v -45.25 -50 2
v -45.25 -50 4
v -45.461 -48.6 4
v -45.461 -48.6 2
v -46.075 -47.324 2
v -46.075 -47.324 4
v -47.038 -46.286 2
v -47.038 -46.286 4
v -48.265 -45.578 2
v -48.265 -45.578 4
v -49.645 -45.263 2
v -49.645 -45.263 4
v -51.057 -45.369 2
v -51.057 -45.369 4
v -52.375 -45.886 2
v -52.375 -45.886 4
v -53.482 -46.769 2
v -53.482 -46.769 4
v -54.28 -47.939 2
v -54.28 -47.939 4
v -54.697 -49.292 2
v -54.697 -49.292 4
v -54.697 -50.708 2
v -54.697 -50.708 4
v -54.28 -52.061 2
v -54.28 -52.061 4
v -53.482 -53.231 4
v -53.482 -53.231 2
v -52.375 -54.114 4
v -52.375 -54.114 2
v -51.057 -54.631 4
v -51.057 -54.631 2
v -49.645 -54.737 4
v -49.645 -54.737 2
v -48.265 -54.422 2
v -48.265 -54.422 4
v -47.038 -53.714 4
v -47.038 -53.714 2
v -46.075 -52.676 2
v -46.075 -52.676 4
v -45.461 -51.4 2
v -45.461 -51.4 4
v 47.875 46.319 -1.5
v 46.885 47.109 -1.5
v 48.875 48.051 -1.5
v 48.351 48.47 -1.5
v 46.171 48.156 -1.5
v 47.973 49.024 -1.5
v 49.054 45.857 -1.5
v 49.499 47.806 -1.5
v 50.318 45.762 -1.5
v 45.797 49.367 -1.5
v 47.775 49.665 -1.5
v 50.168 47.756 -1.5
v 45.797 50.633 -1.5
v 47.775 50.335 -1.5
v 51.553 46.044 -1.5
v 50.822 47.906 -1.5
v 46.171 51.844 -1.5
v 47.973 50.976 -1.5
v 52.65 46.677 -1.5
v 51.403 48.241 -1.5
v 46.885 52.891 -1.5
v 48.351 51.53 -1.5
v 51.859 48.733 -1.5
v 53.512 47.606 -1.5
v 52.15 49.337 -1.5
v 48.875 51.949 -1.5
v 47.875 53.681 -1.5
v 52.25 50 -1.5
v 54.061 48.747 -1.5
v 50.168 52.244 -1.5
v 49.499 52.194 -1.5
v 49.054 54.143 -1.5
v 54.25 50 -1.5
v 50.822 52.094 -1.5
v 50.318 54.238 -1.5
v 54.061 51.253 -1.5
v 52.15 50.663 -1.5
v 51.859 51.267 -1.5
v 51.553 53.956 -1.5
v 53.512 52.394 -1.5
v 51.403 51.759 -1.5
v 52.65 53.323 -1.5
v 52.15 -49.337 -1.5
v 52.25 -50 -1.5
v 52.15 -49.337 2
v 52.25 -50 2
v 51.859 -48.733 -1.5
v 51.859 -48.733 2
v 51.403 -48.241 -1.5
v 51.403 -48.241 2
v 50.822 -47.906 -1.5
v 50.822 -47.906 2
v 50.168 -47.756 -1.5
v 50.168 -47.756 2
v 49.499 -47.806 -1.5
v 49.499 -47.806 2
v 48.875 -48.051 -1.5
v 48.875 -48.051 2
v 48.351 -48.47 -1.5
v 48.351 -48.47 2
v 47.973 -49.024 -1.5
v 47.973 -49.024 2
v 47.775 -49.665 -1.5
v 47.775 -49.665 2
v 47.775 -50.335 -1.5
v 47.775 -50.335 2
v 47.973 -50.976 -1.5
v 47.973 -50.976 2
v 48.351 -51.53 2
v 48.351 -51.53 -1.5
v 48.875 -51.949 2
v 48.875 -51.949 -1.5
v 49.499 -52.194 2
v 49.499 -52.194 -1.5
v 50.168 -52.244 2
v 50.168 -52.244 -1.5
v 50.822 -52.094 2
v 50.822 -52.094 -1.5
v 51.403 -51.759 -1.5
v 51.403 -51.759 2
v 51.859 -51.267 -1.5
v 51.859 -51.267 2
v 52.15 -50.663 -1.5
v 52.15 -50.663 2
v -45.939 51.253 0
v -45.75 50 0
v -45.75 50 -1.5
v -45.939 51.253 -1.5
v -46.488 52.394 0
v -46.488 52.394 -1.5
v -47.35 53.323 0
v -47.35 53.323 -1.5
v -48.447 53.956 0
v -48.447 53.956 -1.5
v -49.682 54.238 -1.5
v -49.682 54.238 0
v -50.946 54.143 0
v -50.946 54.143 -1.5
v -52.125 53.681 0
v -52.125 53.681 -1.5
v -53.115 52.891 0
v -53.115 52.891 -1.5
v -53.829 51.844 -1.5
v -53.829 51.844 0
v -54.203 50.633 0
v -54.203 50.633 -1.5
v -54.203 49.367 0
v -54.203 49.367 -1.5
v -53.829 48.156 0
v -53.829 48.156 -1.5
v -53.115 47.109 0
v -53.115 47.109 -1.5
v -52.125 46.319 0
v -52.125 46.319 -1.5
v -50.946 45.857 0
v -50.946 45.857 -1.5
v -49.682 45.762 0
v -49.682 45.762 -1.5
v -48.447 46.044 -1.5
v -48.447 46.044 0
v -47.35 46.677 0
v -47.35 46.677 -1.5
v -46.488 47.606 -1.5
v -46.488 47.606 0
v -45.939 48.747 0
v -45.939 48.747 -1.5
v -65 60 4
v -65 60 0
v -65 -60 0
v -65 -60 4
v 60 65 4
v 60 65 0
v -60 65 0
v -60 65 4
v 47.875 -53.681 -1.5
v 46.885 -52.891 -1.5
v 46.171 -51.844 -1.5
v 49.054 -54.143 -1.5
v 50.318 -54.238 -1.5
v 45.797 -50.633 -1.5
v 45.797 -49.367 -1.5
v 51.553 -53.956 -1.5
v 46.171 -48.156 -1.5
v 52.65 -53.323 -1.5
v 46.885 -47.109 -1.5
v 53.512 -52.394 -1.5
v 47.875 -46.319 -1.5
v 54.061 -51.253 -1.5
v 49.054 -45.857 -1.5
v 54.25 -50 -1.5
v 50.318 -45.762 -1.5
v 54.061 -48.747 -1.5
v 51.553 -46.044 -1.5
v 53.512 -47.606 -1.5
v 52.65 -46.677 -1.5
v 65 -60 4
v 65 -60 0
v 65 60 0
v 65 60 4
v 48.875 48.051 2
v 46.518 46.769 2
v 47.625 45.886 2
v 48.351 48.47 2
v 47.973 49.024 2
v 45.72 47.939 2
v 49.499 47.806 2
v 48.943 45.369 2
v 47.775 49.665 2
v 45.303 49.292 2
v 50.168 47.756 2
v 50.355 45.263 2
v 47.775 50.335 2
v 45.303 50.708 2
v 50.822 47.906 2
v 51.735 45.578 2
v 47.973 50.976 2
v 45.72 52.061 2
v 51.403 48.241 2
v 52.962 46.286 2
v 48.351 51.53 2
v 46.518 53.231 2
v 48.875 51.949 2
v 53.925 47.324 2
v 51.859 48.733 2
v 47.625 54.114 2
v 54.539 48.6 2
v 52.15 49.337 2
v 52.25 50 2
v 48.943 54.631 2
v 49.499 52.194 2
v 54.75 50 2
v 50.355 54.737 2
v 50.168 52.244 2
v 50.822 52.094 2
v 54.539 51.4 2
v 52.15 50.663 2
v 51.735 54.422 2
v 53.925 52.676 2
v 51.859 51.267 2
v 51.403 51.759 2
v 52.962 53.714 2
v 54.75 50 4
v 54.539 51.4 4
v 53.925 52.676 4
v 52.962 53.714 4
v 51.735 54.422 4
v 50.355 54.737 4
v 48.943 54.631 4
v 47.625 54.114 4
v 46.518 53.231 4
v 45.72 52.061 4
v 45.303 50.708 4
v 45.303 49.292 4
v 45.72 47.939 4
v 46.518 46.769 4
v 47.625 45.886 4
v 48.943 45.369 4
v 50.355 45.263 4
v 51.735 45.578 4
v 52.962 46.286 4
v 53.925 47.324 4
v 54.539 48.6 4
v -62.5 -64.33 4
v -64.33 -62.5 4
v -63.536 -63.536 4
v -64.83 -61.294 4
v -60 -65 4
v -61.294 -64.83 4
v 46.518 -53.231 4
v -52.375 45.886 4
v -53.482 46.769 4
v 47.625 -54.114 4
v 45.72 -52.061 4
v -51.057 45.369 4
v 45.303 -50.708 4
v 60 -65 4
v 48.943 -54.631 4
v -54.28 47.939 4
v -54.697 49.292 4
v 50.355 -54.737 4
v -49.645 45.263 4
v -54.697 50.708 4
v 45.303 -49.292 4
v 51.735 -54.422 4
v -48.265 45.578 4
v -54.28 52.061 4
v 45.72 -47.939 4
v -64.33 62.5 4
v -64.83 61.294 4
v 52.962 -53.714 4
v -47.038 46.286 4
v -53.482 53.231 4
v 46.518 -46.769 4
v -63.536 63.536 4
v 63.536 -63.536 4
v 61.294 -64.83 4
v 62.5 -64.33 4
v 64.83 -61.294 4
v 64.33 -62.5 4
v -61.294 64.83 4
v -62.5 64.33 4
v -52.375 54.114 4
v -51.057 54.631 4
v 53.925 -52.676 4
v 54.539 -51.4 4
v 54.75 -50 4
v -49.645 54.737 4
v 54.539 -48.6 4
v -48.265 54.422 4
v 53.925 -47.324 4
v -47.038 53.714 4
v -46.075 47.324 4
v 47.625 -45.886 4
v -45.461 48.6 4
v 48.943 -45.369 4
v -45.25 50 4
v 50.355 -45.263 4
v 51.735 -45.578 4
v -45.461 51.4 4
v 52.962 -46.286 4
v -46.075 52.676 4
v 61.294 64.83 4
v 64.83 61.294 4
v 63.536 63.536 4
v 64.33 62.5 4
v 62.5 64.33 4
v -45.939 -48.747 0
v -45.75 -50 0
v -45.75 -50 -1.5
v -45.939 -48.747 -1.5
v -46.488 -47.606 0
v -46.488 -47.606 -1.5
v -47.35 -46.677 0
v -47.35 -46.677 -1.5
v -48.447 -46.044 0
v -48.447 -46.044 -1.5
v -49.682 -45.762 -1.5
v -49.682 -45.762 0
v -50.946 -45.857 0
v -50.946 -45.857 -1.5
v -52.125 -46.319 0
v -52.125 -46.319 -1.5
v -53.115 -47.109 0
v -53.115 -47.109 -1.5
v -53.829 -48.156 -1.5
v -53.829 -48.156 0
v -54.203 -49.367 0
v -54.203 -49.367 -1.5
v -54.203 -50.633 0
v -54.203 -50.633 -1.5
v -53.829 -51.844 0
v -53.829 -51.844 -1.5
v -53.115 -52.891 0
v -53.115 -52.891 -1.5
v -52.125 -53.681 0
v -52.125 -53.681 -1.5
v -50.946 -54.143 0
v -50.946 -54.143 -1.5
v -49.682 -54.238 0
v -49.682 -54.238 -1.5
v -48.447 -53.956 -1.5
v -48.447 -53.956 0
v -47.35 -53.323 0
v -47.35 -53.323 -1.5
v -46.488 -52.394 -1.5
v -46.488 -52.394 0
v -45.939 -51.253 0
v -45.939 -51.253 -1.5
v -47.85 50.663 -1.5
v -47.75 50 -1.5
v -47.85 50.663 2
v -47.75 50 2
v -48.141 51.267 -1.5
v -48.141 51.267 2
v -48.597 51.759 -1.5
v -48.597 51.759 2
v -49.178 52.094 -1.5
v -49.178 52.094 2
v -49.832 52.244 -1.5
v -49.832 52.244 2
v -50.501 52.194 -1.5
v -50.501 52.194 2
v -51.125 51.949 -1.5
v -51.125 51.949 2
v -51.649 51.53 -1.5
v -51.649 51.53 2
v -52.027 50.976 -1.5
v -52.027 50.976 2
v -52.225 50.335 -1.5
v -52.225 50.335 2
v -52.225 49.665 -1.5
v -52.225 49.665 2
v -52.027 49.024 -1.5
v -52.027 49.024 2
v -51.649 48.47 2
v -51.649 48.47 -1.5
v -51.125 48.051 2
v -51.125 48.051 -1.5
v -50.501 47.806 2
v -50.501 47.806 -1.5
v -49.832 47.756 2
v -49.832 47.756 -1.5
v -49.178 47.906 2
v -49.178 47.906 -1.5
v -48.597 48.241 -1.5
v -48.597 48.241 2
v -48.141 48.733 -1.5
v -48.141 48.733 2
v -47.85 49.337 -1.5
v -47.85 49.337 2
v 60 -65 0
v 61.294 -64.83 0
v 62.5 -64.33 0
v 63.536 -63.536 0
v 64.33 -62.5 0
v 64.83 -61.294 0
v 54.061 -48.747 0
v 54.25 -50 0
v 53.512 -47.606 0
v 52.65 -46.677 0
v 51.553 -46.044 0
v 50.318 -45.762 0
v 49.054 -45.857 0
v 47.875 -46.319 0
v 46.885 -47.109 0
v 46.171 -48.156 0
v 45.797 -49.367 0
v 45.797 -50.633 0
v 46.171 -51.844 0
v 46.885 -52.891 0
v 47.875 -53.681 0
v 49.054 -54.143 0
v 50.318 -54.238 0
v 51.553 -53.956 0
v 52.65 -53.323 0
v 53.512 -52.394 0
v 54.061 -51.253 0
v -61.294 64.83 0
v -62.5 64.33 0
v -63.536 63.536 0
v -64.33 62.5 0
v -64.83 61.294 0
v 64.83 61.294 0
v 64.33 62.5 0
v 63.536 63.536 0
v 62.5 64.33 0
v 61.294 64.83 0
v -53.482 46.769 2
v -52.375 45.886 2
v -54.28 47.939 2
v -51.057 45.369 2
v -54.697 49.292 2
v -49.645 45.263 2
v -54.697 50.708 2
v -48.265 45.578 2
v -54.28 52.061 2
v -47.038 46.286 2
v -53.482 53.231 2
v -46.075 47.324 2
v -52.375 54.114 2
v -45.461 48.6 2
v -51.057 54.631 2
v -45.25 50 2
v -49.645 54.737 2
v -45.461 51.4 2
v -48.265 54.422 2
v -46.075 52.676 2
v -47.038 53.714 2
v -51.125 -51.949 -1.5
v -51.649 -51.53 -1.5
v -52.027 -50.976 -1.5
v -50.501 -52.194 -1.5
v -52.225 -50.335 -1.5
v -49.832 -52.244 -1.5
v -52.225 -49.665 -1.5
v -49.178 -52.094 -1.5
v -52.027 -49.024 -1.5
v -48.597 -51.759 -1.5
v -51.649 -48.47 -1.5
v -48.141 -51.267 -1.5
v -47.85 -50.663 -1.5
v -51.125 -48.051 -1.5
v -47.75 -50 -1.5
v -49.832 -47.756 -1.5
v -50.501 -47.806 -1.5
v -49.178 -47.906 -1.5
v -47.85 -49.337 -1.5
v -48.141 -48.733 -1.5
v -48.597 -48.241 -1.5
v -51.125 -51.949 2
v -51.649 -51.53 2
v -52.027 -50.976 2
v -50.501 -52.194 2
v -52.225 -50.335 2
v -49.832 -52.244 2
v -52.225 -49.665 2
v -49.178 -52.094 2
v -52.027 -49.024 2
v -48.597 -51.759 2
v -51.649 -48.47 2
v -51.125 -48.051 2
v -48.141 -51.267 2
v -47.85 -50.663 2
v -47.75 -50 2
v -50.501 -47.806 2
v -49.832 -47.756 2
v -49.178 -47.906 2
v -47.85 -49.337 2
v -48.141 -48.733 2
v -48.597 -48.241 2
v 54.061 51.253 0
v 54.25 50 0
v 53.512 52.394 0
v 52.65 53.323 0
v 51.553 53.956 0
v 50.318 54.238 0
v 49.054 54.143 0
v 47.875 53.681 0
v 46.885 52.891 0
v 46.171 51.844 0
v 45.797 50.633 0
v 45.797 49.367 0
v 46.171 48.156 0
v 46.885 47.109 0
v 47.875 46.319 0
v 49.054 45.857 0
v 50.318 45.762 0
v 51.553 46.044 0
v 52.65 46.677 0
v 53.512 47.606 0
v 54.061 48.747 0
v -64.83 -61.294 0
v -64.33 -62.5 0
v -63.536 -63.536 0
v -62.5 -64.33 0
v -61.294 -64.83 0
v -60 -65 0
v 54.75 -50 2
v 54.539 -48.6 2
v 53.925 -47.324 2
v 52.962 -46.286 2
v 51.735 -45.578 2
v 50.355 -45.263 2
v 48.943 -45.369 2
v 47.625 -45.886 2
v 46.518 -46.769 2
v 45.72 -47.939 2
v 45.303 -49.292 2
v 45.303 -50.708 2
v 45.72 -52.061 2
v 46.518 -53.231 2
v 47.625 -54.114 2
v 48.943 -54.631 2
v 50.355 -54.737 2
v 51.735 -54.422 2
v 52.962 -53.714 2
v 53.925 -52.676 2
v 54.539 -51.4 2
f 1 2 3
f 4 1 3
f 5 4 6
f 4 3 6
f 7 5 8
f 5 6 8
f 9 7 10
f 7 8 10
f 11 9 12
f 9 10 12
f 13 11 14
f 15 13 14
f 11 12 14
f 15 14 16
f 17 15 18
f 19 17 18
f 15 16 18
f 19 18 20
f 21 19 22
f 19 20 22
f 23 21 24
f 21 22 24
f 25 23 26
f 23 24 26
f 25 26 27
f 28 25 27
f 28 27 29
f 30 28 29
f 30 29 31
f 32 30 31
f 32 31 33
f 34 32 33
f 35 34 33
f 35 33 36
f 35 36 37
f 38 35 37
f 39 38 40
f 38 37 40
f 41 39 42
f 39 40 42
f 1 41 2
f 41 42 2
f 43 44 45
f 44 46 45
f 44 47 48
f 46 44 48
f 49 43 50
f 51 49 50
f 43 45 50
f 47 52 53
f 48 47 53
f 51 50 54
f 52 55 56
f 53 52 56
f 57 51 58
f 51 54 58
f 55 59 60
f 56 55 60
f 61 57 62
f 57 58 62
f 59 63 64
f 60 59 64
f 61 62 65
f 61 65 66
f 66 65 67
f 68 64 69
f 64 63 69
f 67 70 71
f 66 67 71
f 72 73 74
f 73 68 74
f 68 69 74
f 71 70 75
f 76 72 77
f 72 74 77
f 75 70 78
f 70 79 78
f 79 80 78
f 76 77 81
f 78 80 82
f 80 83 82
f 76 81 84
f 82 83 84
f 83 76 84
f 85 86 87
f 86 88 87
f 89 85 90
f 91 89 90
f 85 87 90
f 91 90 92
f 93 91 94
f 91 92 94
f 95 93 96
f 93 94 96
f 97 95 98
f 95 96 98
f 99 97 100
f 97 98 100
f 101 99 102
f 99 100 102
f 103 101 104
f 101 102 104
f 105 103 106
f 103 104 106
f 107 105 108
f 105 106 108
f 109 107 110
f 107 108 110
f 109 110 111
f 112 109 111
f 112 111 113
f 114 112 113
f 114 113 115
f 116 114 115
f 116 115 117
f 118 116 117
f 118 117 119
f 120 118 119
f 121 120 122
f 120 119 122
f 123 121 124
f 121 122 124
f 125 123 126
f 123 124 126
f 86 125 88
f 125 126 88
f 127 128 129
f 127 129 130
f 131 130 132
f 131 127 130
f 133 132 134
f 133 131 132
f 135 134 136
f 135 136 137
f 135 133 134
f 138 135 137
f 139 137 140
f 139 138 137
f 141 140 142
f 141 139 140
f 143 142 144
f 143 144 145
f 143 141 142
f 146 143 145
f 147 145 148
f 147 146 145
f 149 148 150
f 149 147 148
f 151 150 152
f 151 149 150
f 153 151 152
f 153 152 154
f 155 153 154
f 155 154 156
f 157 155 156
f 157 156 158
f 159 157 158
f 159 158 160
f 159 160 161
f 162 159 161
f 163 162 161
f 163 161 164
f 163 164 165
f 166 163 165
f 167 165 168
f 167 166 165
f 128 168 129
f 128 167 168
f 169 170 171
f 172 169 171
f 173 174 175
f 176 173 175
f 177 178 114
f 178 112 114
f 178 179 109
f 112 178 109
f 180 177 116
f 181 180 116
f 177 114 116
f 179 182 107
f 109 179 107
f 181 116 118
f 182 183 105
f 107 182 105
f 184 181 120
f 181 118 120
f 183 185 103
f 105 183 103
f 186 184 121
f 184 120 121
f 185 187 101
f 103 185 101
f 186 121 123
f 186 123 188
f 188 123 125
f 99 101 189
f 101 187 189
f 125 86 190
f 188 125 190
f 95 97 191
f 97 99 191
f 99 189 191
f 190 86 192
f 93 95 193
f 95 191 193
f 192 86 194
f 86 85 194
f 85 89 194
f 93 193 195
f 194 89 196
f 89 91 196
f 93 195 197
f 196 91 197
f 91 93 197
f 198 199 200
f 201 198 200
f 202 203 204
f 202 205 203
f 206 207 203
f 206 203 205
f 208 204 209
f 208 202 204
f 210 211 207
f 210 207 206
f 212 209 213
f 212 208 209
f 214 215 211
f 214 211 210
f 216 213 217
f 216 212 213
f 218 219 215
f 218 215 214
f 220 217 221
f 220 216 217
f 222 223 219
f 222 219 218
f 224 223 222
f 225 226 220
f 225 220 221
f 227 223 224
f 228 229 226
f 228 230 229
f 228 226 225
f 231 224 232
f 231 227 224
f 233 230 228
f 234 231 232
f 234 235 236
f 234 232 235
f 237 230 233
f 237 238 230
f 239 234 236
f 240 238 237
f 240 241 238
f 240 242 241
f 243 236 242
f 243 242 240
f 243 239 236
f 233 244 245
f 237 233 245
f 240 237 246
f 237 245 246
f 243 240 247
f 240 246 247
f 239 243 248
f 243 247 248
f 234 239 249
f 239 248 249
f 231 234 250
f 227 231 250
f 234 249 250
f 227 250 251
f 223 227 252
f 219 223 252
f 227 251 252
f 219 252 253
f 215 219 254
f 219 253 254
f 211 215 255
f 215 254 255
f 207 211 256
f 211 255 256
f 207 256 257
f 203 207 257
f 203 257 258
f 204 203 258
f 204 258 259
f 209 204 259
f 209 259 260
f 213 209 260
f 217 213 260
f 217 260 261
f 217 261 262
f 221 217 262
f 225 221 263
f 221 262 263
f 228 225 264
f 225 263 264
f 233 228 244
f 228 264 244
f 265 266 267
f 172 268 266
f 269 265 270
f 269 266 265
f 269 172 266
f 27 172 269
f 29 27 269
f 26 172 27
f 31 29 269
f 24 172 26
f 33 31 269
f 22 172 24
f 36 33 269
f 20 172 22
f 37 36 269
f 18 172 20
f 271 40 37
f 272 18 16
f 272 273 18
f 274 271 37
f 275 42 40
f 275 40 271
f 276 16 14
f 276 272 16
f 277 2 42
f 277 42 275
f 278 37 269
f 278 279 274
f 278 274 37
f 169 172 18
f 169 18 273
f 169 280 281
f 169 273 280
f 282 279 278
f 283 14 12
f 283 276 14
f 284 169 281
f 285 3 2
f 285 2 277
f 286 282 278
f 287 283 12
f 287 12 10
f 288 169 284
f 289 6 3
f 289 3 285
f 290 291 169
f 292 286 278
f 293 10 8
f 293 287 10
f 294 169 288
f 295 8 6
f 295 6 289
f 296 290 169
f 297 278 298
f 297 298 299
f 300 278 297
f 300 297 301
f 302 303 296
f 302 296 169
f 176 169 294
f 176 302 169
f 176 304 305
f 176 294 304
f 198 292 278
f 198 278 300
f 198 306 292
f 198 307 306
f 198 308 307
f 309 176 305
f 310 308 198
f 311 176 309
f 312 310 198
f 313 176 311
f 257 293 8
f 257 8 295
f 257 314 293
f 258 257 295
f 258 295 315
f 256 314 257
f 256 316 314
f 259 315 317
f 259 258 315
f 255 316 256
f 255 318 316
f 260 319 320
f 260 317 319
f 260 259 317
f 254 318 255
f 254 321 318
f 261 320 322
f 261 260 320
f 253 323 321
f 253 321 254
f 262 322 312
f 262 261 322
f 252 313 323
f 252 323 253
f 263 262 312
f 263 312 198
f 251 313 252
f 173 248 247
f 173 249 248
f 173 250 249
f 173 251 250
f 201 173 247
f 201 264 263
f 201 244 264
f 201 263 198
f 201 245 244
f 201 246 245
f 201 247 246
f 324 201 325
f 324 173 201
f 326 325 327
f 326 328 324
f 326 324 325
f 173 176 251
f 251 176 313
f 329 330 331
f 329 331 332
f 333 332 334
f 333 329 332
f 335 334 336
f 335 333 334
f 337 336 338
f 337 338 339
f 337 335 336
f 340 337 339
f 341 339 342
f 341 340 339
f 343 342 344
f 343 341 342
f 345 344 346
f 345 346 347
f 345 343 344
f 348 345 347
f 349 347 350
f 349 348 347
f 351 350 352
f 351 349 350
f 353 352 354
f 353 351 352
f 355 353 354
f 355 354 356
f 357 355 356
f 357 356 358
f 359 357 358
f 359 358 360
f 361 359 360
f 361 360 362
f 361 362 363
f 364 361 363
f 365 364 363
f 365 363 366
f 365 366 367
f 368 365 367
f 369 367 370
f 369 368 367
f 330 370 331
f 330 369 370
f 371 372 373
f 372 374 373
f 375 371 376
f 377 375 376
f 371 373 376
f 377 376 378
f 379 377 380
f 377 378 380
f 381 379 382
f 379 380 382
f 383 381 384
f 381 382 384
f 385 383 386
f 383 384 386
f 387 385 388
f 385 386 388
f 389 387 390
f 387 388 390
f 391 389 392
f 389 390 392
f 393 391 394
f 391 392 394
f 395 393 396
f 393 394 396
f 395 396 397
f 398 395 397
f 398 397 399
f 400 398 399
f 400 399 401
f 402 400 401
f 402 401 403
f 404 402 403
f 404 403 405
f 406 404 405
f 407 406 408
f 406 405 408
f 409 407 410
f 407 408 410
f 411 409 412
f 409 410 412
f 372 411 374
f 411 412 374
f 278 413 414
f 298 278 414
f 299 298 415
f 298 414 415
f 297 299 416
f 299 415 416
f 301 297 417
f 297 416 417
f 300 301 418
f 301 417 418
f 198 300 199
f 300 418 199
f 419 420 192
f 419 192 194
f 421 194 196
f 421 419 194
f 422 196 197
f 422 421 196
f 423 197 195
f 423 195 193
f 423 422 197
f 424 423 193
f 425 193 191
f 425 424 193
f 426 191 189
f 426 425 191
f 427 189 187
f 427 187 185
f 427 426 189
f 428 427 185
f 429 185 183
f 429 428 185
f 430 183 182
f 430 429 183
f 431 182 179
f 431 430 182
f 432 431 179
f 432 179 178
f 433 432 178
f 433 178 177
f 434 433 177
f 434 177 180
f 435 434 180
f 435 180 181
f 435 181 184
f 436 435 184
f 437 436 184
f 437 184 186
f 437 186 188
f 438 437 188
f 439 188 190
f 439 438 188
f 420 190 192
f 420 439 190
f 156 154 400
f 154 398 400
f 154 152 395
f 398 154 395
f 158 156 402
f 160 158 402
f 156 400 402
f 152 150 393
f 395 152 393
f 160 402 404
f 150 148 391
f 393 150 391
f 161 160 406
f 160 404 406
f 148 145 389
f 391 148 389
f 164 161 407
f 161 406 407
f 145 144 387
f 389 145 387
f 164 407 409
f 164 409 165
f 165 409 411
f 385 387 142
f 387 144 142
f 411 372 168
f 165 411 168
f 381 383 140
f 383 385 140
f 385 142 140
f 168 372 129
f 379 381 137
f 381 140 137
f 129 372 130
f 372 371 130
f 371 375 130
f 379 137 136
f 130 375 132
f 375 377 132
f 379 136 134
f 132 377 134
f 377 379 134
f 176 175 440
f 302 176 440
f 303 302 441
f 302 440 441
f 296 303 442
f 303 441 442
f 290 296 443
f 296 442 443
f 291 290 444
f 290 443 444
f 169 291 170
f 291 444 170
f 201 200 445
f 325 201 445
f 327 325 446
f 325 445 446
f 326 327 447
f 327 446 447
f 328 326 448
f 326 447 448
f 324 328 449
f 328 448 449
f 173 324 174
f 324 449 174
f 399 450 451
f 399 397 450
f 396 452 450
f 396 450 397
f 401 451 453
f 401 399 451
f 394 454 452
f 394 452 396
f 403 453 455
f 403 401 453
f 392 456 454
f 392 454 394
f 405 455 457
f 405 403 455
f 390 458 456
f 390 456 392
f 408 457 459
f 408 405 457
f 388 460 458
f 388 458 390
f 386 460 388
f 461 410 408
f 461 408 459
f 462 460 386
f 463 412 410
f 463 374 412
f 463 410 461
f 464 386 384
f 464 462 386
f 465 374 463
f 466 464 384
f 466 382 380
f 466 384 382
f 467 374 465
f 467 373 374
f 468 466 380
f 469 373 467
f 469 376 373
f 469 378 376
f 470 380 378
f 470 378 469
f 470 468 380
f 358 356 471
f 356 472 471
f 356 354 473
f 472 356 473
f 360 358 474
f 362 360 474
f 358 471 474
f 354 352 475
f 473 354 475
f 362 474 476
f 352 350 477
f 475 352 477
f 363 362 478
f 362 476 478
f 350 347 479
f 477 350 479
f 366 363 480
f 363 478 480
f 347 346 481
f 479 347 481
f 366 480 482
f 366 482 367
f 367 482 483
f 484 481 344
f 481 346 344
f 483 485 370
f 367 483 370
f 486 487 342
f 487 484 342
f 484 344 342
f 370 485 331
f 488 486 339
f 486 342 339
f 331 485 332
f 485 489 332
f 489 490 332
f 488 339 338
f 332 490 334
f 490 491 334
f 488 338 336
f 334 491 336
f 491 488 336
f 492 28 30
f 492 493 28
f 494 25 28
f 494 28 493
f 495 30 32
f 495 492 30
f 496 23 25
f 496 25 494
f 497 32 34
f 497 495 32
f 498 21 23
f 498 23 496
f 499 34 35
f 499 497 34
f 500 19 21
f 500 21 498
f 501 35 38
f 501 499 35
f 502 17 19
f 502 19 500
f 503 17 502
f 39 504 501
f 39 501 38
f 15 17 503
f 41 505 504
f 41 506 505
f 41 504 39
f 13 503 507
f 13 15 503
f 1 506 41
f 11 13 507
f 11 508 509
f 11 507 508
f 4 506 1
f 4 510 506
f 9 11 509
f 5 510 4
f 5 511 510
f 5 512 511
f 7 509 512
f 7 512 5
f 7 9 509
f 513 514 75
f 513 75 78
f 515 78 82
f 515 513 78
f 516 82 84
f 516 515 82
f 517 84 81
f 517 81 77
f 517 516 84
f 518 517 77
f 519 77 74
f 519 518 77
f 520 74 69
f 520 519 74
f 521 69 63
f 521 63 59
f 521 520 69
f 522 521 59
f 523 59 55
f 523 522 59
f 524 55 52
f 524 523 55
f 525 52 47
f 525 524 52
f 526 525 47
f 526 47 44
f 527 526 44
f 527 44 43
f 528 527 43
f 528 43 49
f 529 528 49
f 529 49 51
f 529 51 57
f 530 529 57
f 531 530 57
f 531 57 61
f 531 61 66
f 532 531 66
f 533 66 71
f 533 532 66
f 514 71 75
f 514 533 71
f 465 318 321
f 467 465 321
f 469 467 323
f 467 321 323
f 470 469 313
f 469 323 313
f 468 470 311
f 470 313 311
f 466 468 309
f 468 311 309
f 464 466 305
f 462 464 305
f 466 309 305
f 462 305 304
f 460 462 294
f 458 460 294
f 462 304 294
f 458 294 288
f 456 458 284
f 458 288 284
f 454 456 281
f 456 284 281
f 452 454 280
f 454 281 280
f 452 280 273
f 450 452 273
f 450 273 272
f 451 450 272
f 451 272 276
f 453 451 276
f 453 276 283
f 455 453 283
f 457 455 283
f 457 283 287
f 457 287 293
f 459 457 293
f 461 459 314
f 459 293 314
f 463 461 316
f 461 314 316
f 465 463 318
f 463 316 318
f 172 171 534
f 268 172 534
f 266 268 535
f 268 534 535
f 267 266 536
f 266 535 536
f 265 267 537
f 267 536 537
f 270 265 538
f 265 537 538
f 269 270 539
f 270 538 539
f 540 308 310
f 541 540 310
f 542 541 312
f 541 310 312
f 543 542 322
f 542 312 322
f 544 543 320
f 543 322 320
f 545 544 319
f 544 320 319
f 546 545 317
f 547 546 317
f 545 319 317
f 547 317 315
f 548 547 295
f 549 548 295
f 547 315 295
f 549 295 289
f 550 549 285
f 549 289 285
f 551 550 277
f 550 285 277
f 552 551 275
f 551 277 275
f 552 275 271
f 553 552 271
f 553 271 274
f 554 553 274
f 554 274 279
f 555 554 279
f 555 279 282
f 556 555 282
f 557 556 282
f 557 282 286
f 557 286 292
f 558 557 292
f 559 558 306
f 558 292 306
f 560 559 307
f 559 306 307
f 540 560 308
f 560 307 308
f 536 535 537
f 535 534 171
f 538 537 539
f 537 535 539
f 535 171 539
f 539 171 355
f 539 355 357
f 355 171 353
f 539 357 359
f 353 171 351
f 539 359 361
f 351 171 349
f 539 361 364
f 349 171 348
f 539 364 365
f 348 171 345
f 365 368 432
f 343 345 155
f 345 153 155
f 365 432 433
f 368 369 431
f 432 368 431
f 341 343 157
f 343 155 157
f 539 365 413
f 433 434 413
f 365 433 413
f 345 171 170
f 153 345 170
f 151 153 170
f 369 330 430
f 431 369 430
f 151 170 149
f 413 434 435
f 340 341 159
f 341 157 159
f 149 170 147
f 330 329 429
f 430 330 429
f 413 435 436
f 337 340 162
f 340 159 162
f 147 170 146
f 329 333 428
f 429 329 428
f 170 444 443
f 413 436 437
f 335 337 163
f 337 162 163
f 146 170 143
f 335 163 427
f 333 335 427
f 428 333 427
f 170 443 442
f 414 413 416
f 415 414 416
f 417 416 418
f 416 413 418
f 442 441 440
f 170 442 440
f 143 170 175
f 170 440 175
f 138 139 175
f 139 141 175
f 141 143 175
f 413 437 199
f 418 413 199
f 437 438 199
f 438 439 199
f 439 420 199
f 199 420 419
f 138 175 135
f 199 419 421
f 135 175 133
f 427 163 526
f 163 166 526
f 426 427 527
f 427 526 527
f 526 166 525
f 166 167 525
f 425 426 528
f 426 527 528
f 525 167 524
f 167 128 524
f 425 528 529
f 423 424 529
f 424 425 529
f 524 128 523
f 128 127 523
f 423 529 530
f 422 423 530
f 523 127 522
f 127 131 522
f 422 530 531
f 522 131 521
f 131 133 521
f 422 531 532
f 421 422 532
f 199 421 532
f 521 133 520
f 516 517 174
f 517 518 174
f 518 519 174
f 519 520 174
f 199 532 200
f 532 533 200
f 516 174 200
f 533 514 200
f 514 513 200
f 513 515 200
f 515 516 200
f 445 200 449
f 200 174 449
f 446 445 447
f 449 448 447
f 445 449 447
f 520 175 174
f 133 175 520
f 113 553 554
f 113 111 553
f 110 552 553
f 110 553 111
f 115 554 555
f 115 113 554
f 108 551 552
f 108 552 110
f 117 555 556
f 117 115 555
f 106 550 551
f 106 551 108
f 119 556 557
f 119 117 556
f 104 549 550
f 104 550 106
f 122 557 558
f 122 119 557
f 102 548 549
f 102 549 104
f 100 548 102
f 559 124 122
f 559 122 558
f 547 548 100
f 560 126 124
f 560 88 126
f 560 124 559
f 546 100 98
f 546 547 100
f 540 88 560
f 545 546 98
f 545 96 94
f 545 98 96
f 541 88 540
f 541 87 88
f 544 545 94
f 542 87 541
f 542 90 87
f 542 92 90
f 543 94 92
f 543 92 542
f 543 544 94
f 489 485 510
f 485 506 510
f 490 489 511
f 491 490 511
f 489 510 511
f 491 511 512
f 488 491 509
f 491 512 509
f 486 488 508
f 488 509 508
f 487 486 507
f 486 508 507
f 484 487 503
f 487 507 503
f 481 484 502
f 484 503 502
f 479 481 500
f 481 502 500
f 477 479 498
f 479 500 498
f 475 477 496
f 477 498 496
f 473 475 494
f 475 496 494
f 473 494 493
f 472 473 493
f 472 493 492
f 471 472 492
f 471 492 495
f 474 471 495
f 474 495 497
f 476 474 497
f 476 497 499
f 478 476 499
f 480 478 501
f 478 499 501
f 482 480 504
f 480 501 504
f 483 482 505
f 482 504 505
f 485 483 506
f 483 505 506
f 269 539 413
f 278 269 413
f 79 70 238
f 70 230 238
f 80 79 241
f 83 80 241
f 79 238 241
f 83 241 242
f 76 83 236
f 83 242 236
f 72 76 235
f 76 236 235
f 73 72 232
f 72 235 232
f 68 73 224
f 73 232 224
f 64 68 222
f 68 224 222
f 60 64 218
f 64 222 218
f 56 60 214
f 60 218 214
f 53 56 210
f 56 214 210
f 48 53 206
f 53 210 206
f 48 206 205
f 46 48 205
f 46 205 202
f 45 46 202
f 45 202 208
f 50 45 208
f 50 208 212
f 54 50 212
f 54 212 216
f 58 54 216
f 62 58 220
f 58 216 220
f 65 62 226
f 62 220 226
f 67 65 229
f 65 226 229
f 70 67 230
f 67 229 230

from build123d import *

# Parameters (mm, degrees)
F0_R     = 4.25
F0_R_2   = 2.25
F1_DEPTH = 4
F2_DEPTH = 1.5
F3_R     = 4.75
F3_R_2   = 2.25
F4_DEPTH = 2


with BuildPart() as f1:
    # F0 (on Top) → F1 (new body)
    with BuildSketch(Plane.XY):
        with BuildLine():
            ThreePointArc((-65, -60), (-63.5355339059, -63.5355339059), (-60, -65))
            Line((-60, -65), (60, -65))
            ThreePointArc((60, -65), (63.5355339059, -63.5355339059), (65, -60))
            Line((65, -60), (65, 60))
            ThreePointArc((65, 60), (63.5355339059, 63.5355339059), (60, 65))
            Line((60, 65), (-60, 65))
            ThreePointArc((-60, 65), (-63.5355339059, 63.5355339059), (-65, 60))
            Line((-65, 60), (-65, -60))
        make_face()
        with Locations((-50, -50)):
            Circle(F0_R, mode=Mode.SUBTRACT)
        with Locations((50, -50)):
            Circle(F0_R, mode=Mode.SUBTRACT)
        with Locations((-50, 50)):
            Circle(F0_R, mode=Mode.SUBTRACT)
        with Locations((50, 50)):
            Circle(F0_R, mode=Mode.SUBTRACT)
        with Locations((-50, -50)):
            Circle(F0_R)
        with Locations((-50, -50)):
            Circle(F0_R_2, mode=Mode.SUBTRACT)
        with Locations((50, -50)):
            Circle(F0_R)
        with Locations((50, -50)):
            Circle(F0_R_2, mode=Mode.SUBTRACT)
        with Locations((50, 50)):
            Circle(F0_R)
        with Locations((50, 50)):
            Circle(F0_R_2, mode=Mode.SUBTRACT)
        with Locations((-50, 50)):
            Circle(F0_R)
        with Locations((-50, 50)):
            Circle(F0_R_2, mode=Mode.SUBTRACT)
    extrude(amount=F1_DEPTH)

    # F0 (on Top) → F2 (join)
    with BuildSketch(Plane.XY):
        with Locations((50, -50)):
            Circle(F0_R)
        with Locations((50, -50)):
            Circle(F0_R_2, mode=Mode.SUBTRACT)
        with Locations((50, 50)):
            Circle(F0_R)
        with Locations((50, 50)):
            Circle(F0_R_2, mode=Mode.SUBTRACT)
        with Locations((-50, 50)):
            Circle(F0_R)
        with Locations((-50, 50)):
            Circle(F0_R_2, mode=Mode.SUBTRACT)
        with Locations((-50, -50)):
            Circle(F0_R)
        with Locations((-50, -50)):
            Circle(F0_R_2, mode=Mode.SUBTRACT)
    extrude(amount=-F2_DEPTH)

    # F3 (on face) → F4 (cut)
    with BuildSketch(Plane.XY.offset(4)):
        with Locations((-50, 50)):
            Circle(F3_R)
        with Locations((-50, 50)):
            Circle(F3_R_2, mode=Mode.SUBTRACT)
        with Locations((50, 50)):
            Circle(F3_R)
        with Locations((50, 50)):
            Circle(F3_R_2, mode=Mode.SUBTRACT)
        with Locations((50, -50)):
            Circle(F3_R)
        with Locations((50, -50)):
            Circle(F3_R_2, mode=Mode.SUBTRACT)
        with Locations((-50, -50)):
            Circle(F3_R)
        with Locations((-50, -50)):
            Circle(F3_R_2, mode=Mode.SUBTRACT)
    extrude(amount=-F4_DEPTH, mode=Mode.SUBTRACT)


solid = f1.part
